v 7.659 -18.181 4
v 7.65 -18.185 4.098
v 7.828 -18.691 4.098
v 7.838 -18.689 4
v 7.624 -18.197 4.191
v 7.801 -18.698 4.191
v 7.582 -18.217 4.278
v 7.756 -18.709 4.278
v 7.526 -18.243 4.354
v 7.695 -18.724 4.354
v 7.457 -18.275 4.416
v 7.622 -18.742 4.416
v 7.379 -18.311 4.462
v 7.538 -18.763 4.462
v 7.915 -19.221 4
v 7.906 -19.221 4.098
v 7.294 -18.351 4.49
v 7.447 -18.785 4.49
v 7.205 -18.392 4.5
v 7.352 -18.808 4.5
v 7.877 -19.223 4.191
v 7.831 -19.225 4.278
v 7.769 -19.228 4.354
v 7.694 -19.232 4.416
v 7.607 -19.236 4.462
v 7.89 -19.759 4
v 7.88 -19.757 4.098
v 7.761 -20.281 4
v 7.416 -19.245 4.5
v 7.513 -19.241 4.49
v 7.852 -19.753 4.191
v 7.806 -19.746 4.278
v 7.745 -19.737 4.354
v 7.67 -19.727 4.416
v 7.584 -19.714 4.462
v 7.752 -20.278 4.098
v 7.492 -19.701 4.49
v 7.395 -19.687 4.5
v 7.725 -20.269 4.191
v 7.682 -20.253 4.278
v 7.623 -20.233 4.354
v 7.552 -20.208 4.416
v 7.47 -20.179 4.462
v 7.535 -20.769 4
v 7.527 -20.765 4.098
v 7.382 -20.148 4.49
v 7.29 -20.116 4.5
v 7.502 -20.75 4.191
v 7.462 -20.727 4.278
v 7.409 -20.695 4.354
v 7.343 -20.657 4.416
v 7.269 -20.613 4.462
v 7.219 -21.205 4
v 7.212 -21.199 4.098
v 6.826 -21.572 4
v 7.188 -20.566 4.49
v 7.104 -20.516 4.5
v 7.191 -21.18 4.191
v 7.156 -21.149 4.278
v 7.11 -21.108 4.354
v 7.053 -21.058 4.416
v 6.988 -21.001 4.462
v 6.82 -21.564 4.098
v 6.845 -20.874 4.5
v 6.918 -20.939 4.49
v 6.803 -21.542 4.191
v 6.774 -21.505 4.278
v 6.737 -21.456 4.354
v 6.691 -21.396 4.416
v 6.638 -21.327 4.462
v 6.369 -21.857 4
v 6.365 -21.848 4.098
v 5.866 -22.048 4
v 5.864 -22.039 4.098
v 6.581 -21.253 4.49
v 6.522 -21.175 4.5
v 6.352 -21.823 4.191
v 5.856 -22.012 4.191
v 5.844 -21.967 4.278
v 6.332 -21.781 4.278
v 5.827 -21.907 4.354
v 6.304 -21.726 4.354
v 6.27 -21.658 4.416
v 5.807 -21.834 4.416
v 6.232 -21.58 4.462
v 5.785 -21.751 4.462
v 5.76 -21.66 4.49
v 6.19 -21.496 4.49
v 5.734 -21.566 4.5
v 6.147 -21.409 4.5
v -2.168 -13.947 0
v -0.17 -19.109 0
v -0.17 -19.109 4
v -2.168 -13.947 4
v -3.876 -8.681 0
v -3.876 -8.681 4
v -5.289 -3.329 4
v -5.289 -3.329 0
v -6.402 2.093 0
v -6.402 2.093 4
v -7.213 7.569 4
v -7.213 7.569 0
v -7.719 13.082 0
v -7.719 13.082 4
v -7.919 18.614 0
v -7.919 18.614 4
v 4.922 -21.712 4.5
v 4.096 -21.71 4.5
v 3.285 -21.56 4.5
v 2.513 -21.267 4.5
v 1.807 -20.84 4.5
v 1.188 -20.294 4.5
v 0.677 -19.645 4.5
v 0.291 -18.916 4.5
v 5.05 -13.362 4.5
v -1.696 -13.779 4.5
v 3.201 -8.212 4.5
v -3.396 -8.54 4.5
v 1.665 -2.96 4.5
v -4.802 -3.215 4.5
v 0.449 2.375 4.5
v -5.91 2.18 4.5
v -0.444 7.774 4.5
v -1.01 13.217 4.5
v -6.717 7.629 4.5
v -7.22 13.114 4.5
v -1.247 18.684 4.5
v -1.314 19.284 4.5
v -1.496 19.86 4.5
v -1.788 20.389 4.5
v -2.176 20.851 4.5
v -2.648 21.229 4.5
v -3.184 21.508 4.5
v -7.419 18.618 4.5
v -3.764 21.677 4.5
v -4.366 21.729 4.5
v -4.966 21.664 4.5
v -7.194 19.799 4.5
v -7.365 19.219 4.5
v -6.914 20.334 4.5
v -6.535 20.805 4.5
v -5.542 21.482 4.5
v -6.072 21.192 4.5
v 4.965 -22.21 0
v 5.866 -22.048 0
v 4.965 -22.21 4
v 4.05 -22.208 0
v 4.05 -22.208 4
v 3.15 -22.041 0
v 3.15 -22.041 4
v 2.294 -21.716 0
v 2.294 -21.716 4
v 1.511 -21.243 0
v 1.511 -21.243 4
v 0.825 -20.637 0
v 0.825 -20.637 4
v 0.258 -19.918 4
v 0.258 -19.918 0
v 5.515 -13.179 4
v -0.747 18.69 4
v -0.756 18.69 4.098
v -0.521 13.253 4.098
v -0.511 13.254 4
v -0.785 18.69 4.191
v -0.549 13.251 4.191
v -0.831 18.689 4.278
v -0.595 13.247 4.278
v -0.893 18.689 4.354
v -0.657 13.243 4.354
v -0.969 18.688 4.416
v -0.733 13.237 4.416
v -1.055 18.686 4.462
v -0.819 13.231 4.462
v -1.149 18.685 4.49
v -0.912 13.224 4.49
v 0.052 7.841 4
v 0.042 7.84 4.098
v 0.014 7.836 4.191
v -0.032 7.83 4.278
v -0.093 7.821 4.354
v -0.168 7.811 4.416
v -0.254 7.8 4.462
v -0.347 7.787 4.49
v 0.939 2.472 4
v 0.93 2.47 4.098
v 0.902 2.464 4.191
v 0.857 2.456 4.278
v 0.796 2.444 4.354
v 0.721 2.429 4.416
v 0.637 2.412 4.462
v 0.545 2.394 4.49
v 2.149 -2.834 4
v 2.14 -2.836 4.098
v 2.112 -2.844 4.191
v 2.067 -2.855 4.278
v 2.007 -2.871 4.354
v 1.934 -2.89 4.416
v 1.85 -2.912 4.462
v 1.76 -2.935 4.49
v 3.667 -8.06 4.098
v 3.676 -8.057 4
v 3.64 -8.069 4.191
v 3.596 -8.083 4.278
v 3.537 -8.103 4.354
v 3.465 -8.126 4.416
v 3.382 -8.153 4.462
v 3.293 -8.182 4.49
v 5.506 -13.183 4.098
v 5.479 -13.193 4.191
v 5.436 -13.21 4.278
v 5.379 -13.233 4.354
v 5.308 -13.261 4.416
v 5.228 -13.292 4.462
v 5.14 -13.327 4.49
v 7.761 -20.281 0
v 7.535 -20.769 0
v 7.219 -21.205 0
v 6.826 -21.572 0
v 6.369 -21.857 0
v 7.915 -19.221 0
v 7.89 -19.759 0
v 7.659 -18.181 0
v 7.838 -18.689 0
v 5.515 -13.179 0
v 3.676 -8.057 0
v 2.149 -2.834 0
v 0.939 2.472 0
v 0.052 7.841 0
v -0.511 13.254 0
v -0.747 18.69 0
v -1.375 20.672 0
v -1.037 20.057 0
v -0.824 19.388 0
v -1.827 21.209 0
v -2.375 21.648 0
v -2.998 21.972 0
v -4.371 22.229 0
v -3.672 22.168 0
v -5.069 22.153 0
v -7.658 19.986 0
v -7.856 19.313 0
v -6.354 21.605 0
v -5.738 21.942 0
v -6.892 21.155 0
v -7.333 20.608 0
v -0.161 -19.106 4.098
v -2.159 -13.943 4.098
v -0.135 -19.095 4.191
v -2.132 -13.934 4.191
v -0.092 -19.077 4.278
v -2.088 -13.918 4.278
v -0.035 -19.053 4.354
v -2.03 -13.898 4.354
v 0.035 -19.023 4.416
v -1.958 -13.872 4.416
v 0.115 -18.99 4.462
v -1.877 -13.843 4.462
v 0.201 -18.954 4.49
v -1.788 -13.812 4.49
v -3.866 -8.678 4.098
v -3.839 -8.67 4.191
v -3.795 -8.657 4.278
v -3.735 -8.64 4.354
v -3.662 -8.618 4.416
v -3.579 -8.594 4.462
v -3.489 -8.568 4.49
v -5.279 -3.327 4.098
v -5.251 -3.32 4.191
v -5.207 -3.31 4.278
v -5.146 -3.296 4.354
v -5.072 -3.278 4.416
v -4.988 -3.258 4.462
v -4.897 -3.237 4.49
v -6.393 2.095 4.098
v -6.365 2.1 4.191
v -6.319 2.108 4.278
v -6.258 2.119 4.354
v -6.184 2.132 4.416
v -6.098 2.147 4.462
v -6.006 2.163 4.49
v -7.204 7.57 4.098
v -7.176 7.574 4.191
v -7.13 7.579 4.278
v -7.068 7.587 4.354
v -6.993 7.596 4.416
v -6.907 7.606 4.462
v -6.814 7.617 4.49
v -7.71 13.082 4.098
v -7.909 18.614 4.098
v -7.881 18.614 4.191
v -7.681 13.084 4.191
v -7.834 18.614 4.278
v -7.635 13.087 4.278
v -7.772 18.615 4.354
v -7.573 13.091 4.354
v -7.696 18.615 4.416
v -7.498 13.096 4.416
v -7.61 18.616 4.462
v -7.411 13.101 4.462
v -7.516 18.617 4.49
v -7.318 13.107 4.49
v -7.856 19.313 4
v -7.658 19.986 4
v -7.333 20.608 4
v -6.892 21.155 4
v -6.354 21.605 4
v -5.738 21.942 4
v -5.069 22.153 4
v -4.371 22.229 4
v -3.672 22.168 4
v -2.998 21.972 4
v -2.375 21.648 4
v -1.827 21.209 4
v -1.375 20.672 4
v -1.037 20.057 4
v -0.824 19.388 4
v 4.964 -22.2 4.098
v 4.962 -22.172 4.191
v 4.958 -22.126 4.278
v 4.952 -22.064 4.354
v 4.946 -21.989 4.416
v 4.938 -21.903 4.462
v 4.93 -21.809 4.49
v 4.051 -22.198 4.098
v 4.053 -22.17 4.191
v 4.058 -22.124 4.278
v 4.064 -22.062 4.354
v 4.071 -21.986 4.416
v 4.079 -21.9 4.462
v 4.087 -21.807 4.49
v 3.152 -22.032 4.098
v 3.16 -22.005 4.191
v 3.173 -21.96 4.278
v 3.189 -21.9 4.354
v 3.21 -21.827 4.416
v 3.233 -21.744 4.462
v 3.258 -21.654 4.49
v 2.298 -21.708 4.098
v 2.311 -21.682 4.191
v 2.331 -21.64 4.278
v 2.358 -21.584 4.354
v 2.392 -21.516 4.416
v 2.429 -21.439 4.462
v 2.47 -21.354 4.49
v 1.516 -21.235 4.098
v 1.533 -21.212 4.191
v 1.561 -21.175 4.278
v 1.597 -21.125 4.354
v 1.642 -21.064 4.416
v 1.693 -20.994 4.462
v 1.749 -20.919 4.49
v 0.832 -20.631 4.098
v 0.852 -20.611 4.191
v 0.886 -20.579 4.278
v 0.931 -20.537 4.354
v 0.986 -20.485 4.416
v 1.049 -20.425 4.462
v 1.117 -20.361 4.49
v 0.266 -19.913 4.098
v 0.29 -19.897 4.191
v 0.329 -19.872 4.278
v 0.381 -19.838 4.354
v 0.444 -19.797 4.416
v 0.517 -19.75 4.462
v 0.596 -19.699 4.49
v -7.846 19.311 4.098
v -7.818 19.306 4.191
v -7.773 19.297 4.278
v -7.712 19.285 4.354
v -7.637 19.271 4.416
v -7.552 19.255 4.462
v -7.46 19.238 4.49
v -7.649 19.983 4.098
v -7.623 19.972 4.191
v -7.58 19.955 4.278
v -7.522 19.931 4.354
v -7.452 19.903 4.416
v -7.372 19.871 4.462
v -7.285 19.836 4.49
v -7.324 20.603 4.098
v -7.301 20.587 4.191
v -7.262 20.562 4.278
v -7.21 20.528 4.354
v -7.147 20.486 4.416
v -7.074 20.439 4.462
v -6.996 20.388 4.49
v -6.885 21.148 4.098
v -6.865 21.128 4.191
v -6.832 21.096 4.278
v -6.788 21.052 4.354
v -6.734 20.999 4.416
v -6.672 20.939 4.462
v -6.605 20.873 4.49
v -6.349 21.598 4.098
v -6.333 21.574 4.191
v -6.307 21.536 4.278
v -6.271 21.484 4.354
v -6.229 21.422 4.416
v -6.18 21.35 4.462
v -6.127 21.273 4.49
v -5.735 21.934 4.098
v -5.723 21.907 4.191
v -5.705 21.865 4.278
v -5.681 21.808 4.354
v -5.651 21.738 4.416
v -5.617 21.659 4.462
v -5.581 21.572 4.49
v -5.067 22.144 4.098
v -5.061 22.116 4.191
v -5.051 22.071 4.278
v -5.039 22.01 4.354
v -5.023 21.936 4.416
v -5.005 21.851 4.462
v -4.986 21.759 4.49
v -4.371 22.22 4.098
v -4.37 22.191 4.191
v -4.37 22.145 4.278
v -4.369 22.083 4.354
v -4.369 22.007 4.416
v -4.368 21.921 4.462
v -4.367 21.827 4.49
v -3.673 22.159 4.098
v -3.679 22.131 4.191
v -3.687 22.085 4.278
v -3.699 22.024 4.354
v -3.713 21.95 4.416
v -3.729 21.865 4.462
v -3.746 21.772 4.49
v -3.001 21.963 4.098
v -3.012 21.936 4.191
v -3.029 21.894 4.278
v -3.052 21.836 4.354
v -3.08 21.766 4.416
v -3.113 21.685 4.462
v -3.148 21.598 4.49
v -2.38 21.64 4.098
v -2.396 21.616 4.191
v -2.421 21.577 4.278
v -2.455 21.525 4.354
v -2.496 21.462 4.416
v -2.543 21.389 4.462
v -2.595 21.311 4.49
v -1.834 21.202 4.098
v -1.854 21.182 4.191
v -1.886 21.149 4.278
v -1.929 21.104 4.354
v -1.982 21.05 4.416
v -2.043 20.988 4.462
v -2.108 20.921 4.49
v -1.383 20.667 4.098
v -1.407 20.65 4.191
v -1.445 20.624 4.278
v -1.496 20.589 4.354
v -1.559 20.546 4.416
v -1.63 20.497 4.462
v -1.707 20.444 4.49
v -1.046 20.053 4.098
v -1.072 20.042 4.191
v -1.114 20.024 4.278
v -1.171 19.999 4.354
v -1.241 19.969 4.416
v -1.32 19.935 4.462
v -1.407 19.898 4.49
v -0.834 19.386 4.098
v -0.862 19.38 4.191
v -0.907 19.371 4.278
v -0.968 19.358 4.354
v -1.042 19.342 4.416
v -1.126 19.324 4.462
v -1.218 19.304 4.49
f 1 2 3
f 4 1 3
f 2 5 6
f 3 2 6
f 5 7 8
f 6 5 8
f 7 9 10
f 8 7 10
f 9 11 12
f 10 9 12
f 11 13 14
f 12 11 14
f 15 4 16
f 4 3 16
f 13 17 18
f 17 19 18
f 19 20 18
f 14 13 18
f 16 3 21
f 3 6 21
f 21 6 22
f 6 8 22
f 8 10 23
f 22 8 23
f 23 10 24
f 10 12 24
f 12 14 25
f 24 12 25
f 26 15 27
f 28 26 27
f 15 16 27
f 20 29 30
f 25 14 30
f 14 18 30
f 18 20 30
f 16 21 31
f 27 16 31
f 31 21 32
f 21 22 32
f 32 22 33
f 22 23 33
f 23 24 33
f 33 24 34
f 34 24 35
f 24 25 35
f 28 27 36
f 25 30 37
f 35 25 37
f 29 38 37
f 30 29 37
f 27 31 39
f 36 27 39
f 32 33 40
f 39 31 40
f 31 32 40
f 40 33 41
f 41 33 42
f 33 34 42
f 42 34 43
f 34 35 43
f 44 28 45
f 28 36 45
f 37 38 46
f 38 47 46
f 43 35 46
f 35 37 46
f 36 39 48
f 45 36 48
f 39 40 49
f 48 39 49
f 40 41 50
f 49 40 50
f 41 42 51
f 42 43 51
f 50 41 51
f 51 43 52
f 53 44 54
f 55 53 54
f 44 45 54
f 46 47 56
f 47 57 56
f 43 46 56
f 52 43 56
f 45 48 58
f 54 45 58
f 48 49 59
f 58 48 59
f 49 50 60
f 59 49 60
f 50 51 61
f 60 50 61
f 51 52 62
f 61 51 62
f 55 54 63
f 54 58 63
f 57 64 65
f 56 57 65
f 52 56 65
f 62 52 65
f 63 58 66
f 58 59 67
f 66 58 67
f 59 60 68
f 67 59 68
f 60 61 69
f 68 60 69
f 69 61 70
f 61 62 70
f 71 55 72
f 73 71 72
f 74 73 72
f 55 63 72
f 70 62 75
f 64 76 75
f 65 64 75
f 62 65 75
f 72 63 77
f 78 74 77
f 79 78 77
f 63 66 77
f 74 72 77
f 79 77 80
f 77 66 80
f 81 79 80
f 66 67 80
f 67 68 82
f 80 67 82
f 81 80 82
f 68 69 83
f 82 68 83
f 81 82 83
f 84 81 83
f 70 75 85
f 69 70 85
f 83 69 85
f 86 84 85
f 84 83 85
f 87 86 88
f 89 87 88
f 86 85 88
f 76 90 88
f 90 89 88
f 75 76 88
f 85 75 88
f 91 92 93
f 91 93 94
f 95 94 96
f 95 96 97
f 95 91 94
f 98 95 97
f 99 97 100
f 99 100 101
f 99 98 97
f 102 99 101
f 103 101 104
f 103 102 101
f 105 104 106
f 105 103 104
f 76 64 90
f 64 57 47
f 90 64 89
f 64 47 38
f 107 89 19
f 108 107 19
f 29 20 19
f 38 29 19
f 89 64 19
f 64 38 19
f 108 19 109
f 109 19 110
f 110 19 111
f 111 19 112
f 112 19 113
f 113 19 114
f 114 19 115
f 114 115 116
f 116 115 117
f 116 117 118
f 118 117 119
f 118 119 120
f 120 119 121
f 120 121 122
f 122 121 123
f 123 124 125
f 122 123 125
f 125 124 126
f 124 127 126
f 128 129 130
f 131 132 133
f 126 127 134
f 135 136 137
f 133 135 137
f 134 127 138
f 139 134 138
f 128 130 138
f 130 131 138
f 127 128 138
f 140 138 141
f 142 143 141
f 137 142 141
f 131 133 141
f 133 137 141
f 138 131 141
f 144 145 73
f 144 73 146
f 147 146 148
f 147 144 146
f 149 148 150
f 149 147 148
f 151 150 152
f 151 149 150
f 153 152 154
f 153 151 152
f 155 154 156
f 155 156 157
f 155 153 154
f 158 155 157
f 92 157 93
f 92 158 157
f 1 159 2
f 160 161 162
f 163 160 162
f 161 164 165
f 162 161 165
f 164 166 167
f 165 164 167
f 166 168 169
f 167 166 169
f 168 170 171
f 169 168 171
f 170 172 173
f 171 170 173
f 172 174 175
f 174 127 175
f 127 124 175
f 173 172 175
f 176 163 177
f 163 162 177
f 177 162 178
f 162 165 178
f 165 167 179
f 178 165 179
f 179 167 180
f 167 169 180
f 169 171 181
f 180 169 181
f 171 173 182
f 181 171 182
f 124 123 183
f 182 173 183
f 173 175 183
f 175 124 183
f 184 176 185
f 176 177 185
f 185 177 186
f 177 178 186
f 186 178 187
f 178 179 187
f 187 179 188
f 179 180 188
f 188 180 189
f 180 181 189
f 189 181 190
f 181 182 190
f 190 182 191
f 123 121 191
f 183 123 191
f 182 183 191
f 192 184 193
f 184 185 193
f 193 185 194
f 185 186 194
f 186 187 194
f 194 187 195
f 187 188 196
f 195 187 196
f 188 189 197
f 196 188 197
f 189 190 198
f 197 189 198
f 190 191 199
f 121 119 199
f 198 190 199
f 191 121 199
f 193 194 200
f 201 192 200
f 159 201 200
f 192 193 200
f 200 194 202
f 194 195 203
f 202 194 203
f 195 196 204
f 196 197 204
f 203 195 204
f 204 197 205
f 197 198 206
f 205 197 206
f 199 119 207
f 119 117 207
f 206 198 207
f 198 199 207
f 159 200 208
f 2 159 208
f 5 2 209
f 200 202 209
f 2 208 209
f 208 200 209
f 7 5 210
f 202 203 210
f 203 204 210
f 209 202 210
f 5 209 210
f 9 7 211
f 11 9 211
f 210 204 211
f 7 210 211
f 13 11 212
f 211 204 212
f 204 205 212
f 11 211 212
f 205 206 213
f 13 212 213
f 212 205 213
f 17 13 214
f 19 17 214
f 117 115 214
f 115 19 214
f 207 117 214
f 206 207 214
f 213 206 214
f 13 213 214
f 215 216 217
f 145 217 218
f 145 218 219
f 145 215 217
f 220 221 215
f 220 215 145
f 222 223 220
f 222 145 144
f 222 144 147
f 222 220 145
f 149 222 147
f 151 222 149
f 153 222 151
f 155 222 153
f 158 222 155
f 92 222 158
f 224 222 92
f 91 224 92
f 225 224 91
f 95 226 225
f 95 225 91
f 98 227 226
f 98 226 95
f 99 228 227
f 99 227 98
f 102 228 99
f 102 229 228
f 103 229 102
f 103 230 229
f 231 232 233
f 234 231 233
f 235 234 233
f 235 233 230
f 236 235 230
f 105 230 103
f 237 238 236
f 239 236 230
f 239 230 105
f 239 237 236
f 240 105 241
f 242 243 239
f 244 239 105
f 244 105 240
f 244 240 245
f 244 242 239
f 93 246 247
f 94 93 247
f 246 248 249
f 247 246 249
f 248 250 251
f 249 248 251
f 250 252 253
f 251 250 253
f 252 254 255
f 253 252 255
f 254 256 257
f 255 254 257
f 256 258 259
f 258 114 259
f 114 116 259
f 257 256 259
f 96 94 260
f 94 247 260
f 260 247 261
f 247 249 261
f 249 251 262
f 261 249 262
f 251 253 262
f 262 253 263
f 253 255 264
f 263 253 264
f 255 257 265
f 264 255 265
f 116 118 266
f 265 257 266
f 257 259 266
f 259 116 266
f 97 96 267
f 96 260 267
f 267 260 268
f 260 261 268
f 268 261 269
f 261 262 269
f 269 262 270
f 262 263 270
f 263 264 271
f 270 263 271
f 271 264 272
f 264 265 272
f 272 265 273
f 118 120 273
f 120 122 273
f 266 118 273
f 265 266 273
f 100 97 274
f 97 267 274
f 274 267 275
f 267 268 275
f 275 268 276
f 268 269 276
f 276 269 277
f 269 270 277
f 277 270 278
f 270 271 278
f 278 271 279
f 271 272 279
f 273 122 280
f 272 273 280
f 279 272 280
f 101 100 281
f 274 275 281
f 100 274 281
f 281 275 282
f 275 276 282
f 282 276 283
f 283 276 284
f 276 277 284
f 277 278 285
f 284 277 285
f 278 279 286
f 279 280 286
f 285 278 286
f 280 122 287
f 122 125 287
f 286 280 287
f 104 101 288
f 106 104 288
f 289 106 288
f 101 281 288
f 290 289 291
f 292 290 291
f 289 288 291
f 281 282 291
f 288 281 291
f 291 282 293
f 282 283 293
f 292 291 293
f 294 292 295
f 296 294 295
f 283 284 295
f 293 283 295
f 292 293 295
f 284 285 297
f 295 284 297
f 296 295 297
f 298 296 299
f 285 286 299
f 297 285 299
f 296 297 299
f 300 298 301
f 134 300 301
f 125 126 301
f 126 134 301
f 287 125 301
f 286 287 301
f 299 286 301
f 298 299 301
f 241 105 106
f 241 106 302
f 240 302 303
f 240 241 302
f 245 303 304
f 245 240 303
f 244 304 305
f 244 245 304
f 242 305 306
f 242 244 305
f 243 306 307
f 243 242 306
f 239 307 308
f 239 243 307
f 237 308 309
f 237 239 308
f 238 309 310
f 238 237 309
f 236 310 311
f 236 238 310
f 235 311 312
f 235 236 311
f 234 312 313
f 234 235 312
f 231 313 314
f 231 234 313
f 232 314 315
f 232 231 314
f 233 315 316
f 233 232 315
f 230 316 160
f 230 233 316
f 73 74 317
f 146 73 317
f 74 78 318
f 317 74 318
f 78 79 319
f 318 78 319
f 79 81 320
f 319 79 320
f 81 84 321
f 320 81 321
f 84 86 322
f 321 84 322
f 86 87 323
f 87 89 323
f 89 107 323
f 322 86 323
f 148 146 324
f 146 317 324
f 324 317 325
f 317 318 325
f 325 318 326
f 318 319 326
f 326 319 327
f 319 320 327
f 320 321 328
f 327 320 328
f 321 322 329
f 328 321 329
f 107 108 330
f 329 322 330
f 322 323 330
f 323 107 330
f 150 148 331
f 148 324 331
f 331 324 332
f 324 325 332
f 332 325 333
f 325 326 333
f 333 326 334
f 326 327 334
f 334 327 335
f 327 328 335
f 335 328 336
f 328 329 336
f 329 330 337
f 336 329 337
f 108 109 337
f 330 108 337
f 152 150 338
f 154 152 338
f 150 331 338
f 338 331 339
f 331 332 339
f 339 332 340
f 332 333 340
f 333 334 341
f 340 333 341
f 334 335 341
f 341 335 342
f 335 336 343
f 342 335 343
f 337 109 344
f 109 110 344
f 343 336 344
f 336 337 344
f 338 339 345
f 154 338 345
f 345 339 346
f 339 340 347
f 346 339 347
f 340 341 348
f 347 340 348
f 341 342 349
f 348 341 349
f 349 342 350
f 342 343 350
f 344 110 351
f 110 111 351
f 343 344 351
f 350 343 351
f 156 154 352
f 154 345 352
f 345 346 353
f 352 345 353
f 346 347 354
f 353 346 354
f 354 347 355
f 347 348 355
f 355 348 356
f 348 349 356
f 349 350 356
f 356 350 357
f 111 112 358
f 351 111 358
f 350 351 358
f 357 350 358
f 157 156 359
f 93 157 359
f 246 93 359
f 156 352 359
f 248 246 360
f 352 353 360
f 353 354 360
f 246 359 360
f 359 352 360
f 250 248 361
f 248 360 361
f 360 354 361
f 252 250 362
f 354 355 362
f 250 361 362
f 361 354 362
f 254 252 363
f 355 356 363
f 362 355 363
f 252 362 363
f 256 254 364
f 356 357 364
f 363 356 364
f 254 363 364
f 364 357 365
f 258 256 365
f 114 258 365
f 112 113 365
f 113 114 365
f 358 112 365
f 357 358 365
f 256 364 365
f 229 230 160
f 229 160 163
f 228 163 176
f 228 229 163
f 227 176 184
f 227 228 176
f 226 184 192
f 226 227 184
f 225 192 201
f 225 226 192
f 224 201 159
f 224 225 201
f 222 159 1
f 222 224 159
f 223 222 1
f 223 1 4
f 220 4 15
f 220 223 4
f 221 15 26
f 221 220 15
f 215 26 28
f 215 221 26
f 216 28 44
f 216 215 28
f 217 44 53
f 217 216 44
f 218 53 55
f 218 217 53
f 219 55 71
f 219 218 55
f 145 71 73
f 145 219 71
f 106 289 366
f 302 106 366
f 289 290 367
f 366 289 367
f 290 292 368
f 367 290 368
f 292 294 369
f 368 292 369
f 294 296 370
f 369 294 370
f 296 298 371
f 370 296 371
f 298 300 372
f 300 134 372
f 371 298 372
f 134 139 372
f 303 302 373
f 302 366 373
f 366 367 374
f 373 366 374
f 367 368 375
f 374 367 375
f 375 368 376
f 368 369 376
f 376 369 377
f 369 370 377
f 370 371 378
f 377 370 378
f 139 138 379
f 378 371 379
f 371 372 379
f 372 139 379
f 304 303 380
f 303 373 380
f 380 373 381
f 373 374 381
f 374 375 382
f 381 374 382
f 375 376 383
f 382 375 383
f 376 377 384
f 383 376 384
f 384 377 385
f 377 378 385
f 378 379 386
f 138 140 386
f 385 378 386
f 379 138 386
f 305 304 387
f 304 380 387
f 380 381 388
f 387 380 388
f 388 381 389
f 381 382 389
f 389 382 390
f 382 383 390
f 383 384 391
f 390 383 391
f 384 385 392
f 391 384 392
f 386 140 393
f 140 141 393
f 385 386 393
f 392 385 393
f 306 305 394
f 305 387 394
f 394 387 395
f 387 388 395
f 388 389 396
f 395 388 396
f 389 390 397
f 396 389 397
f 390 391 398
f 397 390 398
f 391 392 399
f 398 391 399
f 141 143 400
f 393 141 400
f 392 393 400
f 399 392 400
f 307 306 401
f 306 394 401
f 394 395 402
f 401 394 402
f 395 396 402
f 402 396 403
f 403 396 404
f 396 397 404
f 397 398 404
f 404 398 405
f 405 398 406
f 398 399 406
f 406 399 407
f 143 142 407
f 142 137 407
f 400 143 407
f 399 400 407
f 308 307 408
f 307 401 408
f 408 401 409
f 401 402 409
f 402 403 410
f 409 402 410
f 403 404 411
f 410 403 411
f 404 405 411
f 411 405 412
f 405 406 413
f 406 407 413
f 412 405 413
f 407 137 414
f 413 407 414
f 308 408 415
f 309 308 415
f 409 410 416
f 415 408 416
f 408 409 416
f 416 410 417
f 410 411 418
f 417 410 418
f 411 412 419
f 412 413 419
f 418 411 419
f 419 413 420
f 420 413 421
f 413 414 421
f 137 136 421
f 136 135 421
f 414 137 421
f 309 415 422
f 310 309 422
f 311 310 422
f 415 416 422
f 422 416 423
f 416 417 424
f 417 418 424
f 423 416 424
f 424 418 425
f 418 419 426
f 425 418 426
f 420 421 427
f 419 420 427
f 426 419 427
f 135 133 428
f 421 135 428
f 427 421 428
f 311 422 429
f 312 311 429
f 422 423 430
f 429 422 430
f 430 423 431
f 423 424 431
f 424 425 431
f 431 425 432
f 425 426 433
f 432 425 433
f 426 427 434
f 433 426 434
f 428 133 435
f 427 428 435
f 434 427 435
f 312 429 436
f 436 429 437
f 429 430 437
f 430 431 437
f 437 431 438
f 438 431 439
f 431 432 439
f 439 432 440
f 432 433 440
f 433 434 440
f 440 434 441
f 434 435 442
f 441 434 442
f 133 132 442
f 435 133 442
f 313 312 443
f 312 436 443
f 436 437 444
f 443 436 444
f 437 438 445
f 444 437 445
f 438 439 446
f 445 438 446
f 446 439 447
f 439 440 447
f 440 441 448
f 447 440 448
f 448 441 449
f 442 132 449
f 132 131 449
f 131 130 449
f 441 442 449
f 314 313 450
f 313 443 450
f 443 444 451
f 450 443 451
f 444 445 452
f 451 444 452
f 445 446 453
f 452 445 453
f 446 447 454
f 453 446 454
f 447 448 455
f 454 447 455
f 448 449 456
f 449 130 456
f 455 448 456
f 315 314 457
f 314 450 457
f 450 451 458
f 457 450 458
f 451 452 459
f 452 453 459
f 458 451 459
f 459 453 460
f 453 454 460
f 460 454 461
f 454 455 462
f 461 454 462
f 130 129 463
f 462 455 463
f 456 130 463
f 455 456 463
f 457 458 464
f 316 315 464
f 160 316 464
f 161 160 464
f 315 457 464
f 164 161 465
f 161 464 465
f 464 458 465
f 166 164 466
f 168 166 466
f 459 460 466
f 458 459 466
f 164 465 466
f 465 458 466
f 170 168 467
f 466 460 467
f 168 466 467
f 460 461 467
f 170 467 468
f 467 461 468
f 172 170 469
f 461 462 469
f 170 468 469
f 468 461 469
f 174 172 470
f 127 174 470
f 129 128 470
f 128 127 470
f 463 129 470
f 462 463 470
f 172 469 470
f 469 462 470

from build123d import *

# Parameters (mm, degrees)
EXTRUDE1_DEPTH = 4.5
FILLET1_R      = 0.5


with BuildPart() as part:
    # Sketch1 → Extrude1 (new body)
    with BuildSketch(Plane.XY):
        with BuildLine():
            ThreePointArc((-0.746559936, 18.690444938), (1.504276061, -0.190220828), (7.658793849, -18.180988273))
            ThreePointArc((7.658793849, -18.180988273), (7.66003149, -20.530722722), (5.866174119, -22.048395034))
            ThreePointArc((5.866174119, -22.048395034), (2.294255729, -21.716159254), (-0.170136467, -19.109292801))
            ThreePointArc((-0.170136467, -19.109292801), (-5.883088092, -0.625489951), (-7.918665293, 18.613668282))
            ThreePointArc((-7.918665293, 18.613668282), (-4.370906261, 22.229264553), (-0.746559936, 18.690444938))
        make_face()
    extrude(amount=EXTRUDE1_DEPTH)

    # Fillet1
    fillet1_edges = [part.edges().sort_by_distance(p)[0] for p in [
        (2.294255729, -21.716159254, 4.5),
        (7.66003149, -20.530722722, 4.5),
        (1.504276061, -0.190220828, 4.5),
        (-4.370906261, 22.229264553, 4.5),
        (-5.883088092, -0.625489951, 4.5),
    ]]
    fillet(fillet1_edges, radius=FILLET1_R)


solid = part.part
